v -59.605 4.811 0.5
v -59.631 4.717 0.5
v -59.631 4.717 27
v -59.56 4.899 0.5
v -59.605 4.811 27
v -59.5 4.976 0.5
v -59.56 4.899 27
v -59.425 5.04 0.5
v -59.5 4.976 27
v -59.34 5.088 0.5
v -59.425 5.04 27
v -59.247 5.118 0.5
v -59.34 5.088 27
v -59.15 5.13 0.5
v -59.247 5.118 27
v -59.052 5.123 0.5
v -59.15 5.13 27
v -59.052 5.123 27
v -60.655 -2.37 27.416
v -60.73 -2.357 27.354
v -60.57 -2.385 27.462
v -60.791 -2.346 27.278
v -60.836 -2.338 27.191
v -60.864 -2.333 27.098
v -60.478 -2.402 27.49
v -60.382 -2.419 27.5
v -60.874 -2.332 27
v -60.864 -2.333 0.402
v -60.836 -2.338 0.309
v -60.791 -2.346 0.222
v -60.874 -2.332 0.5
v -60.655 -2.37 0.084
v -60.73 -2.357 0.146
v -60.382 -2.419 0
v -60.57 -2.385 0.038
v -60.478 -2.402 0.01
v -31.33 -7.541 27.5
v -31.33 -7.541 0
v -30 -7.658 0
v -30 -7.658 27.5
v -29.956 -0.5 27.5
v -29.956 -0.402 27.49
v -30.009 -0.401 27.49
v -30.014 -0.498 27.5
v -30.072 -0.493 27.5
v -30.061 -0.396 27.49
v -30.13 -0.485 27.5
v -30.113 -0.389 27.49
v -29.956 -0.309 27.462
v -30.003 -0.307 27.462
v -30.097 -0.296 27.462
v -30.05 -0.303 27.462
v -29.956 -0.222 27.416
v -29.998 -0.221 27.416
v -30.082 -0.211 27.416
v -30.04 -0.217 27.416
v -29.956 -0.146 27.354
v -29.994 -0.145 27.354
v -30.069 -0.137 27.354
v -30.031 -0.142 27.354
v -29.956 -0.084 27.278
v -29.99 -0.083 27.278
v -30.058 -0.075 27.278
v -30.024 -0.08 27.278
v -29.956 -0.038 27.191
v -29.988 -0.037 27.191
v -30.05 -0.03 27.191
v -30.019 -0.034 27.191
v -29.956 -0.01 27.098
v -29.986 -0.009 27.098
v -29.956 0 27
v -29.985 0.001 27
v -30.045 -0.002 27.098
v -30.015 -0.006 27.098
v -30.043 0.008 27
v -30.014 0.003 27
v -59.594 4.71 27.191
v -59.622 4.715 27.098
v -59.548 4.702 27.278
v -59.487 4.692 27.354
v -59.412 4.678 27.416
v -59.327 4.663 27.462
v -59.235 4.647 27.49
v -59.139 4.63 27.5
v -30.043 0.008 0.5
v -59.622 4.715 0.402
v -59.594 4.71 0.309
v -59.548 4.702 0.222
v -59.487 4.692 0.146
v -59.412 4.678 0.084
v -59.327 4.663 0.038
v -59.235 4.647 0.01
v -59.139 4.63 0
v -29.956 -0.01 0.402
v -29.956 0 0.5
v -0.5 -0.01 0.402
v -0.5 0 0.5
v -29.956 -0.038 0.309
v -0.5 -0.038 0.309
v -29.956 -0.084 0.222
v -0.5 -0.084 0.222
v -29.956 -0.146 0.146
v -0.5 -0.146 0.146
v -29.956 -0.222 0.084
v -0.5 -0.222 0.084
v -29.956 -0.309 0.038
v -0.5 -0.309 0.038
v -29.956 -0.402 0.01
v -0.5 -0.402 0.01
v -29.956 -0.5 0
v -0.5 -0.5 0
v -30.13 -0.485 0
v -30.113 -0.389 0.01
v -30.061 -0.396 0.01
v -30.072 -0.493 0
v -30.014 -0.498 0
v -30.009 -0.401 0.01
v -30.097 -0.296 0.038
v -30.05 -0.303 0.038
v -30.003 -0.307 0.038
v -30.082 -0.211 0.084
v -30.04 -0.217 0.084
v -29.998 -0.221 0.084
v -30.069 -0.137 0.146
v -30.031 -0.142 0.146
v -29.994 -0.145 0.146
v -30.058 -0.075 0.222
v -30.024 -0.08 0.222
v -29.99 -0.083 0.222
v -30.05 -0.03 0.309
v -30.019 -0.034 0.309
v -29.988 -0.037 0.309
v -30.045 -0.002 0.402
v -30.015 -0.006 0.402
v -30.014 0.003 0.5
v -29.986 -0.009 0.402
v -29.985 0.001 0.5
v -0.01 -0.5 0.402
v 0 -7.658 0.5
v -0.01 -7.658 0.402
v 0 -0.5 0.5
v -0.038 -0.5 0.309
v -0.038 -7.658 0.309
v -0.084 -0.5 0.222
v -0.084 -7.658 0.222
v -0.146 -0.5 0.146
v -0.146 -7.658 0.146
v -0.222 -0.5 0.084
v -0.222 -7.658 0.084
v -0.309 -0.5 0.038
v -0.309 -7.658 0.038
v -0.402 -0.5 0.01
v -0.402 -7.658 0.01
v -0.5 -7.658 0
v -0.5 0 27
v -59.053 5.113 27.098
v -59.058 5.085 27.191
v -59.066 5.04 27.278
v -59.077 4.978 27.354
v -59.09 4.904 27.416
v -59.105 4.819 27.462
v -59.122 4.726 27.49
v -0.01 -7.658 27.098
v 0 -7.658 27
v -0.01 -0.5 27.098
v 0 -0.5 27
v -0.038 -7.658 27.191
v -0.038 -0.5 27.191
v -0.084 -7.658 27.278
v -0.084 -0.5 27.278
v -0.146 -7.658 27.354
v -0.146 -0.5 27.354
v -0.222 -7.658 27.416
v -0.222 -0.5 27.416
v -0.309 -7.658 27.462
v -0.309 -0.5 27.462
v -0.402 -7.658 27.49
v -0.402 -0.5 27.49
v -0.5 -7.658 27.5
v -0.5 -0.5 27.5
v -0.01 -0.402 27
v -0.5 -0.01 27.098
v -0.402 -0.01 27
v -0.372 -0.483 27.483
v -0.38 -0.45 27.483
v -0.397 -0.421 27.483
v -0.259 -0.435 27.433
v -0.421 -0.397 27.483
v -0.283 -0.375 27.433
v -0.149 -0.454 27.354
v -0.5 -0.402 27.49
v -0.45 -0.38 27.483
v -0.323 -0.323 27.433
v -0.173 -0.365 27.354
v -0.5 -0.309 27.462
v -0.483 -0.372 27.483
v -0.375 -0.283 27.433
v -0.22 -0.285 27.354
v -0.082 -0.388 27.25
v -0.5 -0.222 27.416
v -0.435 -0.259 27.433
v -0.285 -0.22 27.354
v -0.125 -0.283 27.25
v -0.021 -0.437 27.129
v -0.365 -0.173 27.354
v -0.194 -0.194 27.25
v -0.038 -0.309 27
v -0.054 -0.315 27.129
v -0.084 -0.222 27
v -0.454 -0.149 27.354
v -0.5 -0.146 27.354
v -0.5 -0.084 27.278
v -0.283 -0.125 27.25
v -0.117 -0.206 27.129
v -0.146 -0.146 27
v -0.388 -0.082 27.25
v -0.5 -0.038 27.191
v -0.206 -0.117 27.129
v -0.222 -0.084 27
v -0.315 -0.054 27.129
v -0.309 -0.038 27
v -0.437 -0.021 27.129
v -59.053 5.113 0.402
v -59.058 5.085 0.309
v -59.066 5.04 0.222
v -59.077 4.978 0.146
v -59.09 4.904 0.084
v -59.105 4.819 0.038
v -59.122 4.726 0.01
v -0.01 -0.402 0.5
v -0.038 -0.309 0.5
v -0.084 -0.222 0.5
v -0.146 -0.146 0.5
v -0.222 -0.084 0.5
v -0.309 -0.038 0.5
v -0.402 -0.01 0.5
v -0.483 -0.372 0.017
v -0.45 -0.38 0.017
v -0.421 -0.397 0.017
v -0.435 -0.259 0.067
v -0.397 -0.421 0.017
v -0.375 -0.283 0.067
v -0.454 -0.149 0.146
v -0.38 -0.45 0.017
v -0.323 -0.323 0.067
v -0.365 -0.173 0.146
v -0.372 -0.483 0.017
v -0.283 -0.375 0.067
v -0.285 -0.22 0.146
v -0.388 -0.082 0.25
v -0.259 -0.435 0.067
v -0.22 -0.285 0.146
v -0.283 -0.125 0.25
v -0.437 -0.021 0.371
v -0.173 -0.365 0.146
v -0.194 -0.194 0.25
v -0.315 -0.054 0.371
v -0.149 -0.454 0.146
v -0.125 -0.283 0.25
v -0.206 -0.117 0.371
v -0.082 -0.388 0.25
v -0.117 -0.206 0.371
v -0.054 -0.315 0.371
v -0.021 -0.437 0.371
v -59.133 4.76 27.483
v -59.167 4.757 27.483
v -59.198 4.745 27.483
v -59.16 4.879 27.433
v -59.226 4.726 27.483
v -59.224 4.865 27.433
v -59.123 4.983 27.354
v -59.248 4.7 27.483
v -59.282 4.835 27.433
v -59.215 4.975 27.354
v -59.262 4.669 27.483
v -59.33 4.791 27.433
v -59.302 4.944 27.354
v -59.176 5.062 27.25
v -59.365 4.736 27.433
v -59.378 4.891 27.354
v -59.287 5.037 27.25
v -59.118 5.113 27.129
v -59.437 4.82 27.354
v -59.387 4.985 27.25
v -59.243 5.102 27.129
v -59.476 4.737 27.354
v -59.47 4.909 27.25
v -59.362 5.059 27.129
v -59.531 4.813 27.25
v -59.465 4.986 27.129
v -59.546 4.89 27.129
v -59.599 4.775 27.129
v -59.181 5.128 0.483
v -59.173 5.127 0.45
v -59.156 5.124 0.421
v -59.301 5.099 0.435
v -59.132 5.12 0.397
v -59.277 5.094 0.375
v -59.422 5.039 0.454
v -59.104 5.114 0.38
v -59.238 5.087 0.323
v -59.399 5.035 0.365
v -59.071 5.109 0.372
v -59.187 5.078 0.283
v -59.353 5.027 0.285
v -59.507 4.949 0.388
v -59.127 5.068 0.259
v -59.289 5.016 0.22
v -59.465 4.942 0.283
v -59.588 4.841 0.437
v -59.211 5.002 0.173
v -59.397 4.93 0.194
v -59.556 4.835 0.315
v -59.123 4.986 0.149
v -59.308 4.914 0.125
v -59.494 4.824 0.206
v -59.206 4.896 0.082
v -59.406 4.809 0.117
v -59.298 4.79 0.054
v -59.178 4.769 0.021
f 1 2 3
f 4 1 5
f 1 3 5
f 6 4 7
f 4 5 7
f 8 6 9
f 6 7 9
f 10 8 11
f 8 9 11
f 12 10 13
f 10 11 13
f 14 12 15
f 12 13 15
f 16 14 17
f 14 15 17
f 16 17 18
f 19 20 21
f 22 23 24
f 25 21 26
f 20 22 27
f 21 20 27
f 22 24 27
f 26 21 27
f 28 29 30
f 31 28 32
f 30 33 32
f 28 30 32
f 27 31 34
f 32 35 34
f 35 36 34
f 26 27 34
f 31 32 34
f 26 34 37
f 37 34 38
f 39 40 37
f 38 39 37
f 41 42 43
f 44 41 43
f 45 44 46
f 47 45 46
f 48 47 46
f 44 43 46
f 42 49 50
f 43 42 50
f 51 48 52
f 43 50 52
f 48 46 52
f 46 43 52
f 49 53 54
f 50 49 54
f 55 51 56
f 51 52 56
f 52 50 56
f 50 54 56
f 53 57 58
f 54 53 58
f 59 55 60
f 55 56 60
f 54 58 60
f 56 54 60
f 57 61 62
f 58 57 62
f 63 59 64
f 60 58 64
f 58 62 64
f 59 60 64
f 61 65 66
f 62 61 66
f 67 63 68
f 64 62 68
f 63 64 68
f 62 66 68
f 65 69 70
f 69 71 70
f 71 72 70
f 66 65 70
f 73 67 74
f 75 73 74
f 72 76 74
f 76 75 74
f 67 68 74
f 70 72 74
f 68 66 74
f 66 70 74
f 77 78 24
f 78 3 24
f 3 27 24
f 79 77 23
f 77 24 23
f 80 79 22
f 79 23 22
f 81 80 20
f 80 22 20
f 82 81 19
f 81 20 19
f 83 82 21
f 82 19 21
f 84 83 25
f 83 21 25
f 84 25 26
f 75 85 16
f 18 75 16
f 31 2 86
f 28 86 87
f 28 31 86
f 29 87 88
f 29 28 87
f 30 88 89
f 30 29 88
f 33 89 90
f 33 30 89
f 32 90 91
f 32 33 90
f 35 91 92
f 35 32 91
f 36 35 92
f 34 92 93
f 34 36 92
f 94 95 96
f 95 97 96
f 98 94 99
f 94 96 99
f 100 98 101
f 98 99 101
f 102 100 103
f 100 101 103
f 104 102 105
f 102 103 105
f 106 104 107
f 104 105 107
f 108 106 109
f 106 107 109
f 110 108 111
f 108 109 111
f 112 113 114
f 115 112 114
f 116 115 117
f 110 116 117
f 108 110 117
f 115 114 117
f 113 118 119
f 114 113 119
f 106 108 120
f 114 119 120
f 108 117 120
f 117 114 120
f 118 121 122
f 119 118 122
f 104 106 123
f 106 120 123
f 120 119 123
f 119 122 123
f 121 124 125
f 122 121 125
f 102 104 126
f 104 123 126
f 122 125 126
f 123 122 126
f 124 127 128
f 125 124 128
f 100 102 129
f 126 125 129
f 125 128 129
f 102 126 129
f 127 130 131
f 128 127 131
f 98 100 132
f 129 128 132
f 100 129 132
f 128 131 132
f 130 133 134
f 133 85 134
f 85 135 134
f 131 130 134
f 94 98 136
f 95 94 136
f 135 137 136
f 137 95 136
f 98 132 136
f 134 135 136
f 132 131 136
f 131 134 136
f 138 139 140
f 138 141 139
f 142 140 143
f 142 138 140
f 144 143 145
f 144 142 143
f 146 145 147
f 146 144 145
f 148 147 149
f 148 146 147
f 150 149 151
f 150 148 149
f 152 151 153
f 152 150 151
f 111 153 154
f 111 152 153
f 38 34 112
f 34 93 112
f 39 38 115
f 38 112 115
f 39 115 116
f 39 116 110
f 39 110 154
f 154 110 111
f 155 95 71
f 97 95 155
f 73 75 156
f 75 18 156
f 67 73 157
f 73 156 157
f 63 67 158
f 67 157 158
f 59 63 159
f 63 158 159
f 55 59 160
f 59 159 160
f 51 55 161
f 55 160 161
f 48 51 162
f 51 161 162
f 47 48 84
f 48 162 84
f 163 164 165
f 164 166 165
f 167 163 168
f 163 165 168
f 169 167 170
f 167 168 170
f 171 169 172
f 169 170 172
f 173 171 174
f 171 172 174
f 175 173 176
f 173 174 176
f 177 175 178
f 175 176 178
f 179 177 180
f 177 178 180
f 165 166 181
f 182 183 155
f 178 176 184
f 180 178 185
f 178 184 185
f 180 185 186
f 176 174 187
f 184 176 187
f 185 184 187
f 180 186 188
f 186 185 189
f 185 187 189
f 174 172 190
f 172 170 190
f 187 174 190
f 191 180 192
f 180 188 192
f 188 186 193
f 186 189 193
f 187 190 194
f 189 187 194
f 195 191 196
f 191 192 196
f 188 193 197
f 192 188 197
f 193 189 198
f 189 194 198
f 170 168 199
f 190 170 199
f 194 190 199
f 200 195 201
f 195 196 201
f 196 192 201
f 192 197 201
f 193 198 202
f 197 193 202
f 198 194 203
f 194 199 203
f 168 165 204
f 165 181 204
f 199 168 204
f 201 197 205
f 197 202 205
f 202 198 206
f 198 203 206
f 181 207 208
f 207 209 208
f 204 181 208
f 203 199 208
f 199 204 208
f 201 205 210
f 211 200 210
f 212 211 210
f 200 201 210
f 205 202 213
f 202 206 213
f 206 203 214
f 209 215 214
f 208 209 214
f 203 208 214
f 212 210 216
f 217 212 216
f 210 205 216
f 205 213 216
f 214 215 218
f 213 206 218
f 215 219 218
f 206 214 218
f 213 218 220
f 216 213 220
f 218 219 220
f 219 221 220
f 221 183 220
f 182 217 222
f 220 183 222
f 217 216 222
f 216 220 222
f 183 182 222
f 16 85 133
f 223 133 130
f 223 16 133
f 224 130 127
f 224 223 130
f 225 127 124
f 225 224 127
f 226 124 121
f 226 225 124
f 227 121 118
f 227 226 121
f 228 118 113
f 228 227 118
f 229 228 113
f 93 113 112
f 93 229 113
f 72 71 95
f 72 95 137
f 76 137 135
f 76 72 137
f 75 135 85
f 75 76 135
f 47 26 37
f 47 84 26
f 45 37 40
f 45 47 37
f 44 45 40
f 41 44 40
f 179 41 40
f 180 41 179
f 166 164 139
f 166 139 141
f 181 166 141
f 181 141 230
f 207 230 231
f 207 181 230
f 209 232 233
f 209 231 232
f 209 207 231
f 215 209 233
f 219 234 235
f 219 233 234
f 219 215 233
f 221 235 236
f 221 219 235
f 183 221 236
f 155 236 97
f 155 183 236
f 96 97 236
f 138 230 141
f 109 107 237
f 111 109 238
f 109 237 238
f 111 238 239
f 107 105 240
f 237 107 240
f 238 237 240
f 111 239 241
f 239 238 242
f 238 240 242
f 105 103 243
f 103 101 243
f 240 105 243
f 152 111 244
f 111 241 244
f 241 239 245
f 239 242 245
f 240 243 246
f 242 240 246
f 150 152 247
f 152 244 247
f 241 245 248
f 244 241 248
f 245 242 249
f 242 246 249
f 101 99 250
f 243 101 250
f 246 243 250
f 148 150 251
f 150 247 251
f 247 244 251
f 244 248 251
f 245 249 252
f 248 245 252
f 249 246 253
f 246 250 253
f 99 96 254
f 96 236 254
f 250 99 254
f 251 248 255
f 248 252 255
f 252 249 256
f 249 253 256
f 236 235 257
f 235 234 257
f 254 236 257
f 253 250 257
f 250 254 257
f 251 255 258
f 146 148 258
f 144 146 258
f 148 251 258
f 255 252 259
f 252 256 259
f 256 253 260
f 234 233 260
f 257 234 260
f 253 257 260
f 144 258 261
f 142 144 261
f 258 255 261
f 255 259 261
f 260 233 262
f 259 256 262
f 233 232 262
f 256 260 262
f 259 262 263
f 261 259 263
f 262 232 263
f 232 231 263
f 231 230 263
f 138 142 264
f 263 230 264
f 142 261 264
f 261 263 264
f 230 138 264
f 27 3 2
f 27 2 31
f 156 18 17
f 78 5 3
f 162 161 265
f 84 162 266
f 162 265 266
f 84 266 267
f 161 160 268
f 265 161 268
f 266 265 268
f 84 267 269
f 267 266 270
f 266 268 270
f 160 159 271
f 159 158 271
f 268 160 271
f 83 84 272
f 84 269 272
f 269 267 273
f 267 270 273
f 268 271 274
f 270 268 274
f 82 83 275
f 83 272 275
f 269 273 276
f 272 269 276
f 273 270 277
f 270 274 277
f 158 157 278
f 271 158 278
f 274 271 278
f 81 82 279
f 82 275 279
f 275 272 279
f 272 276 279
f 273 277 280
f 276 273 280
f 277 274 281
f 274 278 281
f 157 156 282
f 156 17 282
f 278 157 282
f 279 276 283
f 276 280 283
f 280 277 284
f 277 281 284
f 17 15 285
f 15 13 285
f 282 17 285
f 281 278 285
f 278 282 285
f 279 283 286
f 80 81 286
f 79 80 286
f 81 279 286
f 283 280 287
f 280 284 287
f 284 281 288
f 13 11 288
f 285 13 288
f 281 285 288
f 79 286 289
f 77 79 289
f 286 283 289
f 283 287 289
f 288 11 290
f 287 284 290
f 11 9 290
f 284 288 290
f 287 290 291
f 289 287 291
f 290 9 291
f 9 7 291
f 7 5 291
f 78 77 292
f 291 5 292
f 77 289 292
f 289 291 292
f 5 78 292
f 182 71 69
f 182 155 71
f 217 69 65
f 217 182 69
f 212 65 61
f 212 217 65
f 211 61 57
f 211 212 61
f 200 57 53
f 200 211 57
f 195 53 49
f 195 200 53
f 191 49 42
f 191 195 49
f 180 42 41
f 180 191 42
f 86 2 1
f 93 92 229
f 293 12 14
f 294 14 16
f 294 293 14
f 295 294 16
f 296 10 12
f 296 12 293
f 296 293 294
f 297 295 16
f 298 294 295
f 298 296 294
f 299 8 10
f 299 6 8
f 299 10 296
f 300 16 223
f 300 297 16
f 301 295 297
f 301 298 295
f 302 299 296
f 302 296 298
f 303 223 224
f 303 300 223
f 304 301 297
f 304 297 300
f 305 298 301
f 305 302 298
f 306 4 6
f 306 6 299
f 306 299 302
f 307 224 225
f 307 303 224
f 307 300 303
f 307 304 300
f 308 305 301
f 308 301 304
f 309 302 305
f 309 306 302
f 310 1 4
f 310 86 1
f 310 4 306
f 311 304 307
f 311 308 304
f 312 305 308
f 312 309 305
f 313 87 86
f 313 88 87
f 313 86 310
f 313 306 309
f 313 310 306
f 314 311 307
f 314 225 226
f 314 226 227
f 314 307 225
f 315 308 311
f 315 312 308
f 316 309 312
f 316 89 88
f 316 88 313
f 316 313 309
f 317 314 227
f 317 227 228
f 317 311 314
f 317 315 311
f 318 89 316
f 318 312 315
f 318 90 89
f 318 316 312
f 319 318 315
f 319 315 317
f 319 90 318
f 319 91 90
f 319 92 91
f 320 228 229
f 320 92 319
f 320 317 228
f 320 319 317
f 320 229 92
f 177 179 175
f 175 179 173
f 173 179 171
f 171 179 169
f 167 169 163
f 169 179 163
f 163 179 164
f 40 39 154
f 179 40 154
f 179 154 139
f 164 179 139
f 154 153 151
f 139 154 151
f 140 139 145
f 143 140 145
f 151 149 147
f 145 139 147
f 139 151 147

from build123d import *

# Parameters (mm, degrees)
SKETCH1_W           = 30
SKETCH1_H           = 7.657514459
BOSS_EXTRUDE1_DEPTH = 27.5
FILLET1_R           = 0.5


with BuildPart() as part:
    # Sketch1 → Boss-Extrude1 (new body)
    with BuildSketch(Plane.XY):
        Polygon((-59.54423259, 5.20944533), (-60.873946022, -2.331734278), (-31.329713431, -7.541179608), (-30, 0), align=None)
        Polygon((-30, -7.657514459), (-31.329713431, -7.541179608), (-30, 0), align=None)
        with Locations((-15, -3.82875723)):
            Rectangle(SKETCH1_W, SKETCH1_H)
    extrude(amount=BOSS_EXTRUDE1_DEPTH)

    # Fillet1
    fillet1_edges = [part.edges().sort_by_distance(p)[0] for p in [
        (-60.209089306, 1.438855526, 0),
        (-59.54423259, 5.20944533, 13.75),
        (-30, 0, 13.75),
        (0, 0, 13.75),
        (0, -3.828757229, 27.5),
        (-15, 0, 27.5),
        (-44.772116295, 2.604722665, 27.5),
        (-60.209089306, 1.438855526, 27.5),
        (-44.772116295, 2.604722665, 0),
        (-15, 0, 0),
        (0, -3.828757229, 0),
    ]]
    fillet(fillet1_edges, radius=FILLET1_R)


solid = part.part
